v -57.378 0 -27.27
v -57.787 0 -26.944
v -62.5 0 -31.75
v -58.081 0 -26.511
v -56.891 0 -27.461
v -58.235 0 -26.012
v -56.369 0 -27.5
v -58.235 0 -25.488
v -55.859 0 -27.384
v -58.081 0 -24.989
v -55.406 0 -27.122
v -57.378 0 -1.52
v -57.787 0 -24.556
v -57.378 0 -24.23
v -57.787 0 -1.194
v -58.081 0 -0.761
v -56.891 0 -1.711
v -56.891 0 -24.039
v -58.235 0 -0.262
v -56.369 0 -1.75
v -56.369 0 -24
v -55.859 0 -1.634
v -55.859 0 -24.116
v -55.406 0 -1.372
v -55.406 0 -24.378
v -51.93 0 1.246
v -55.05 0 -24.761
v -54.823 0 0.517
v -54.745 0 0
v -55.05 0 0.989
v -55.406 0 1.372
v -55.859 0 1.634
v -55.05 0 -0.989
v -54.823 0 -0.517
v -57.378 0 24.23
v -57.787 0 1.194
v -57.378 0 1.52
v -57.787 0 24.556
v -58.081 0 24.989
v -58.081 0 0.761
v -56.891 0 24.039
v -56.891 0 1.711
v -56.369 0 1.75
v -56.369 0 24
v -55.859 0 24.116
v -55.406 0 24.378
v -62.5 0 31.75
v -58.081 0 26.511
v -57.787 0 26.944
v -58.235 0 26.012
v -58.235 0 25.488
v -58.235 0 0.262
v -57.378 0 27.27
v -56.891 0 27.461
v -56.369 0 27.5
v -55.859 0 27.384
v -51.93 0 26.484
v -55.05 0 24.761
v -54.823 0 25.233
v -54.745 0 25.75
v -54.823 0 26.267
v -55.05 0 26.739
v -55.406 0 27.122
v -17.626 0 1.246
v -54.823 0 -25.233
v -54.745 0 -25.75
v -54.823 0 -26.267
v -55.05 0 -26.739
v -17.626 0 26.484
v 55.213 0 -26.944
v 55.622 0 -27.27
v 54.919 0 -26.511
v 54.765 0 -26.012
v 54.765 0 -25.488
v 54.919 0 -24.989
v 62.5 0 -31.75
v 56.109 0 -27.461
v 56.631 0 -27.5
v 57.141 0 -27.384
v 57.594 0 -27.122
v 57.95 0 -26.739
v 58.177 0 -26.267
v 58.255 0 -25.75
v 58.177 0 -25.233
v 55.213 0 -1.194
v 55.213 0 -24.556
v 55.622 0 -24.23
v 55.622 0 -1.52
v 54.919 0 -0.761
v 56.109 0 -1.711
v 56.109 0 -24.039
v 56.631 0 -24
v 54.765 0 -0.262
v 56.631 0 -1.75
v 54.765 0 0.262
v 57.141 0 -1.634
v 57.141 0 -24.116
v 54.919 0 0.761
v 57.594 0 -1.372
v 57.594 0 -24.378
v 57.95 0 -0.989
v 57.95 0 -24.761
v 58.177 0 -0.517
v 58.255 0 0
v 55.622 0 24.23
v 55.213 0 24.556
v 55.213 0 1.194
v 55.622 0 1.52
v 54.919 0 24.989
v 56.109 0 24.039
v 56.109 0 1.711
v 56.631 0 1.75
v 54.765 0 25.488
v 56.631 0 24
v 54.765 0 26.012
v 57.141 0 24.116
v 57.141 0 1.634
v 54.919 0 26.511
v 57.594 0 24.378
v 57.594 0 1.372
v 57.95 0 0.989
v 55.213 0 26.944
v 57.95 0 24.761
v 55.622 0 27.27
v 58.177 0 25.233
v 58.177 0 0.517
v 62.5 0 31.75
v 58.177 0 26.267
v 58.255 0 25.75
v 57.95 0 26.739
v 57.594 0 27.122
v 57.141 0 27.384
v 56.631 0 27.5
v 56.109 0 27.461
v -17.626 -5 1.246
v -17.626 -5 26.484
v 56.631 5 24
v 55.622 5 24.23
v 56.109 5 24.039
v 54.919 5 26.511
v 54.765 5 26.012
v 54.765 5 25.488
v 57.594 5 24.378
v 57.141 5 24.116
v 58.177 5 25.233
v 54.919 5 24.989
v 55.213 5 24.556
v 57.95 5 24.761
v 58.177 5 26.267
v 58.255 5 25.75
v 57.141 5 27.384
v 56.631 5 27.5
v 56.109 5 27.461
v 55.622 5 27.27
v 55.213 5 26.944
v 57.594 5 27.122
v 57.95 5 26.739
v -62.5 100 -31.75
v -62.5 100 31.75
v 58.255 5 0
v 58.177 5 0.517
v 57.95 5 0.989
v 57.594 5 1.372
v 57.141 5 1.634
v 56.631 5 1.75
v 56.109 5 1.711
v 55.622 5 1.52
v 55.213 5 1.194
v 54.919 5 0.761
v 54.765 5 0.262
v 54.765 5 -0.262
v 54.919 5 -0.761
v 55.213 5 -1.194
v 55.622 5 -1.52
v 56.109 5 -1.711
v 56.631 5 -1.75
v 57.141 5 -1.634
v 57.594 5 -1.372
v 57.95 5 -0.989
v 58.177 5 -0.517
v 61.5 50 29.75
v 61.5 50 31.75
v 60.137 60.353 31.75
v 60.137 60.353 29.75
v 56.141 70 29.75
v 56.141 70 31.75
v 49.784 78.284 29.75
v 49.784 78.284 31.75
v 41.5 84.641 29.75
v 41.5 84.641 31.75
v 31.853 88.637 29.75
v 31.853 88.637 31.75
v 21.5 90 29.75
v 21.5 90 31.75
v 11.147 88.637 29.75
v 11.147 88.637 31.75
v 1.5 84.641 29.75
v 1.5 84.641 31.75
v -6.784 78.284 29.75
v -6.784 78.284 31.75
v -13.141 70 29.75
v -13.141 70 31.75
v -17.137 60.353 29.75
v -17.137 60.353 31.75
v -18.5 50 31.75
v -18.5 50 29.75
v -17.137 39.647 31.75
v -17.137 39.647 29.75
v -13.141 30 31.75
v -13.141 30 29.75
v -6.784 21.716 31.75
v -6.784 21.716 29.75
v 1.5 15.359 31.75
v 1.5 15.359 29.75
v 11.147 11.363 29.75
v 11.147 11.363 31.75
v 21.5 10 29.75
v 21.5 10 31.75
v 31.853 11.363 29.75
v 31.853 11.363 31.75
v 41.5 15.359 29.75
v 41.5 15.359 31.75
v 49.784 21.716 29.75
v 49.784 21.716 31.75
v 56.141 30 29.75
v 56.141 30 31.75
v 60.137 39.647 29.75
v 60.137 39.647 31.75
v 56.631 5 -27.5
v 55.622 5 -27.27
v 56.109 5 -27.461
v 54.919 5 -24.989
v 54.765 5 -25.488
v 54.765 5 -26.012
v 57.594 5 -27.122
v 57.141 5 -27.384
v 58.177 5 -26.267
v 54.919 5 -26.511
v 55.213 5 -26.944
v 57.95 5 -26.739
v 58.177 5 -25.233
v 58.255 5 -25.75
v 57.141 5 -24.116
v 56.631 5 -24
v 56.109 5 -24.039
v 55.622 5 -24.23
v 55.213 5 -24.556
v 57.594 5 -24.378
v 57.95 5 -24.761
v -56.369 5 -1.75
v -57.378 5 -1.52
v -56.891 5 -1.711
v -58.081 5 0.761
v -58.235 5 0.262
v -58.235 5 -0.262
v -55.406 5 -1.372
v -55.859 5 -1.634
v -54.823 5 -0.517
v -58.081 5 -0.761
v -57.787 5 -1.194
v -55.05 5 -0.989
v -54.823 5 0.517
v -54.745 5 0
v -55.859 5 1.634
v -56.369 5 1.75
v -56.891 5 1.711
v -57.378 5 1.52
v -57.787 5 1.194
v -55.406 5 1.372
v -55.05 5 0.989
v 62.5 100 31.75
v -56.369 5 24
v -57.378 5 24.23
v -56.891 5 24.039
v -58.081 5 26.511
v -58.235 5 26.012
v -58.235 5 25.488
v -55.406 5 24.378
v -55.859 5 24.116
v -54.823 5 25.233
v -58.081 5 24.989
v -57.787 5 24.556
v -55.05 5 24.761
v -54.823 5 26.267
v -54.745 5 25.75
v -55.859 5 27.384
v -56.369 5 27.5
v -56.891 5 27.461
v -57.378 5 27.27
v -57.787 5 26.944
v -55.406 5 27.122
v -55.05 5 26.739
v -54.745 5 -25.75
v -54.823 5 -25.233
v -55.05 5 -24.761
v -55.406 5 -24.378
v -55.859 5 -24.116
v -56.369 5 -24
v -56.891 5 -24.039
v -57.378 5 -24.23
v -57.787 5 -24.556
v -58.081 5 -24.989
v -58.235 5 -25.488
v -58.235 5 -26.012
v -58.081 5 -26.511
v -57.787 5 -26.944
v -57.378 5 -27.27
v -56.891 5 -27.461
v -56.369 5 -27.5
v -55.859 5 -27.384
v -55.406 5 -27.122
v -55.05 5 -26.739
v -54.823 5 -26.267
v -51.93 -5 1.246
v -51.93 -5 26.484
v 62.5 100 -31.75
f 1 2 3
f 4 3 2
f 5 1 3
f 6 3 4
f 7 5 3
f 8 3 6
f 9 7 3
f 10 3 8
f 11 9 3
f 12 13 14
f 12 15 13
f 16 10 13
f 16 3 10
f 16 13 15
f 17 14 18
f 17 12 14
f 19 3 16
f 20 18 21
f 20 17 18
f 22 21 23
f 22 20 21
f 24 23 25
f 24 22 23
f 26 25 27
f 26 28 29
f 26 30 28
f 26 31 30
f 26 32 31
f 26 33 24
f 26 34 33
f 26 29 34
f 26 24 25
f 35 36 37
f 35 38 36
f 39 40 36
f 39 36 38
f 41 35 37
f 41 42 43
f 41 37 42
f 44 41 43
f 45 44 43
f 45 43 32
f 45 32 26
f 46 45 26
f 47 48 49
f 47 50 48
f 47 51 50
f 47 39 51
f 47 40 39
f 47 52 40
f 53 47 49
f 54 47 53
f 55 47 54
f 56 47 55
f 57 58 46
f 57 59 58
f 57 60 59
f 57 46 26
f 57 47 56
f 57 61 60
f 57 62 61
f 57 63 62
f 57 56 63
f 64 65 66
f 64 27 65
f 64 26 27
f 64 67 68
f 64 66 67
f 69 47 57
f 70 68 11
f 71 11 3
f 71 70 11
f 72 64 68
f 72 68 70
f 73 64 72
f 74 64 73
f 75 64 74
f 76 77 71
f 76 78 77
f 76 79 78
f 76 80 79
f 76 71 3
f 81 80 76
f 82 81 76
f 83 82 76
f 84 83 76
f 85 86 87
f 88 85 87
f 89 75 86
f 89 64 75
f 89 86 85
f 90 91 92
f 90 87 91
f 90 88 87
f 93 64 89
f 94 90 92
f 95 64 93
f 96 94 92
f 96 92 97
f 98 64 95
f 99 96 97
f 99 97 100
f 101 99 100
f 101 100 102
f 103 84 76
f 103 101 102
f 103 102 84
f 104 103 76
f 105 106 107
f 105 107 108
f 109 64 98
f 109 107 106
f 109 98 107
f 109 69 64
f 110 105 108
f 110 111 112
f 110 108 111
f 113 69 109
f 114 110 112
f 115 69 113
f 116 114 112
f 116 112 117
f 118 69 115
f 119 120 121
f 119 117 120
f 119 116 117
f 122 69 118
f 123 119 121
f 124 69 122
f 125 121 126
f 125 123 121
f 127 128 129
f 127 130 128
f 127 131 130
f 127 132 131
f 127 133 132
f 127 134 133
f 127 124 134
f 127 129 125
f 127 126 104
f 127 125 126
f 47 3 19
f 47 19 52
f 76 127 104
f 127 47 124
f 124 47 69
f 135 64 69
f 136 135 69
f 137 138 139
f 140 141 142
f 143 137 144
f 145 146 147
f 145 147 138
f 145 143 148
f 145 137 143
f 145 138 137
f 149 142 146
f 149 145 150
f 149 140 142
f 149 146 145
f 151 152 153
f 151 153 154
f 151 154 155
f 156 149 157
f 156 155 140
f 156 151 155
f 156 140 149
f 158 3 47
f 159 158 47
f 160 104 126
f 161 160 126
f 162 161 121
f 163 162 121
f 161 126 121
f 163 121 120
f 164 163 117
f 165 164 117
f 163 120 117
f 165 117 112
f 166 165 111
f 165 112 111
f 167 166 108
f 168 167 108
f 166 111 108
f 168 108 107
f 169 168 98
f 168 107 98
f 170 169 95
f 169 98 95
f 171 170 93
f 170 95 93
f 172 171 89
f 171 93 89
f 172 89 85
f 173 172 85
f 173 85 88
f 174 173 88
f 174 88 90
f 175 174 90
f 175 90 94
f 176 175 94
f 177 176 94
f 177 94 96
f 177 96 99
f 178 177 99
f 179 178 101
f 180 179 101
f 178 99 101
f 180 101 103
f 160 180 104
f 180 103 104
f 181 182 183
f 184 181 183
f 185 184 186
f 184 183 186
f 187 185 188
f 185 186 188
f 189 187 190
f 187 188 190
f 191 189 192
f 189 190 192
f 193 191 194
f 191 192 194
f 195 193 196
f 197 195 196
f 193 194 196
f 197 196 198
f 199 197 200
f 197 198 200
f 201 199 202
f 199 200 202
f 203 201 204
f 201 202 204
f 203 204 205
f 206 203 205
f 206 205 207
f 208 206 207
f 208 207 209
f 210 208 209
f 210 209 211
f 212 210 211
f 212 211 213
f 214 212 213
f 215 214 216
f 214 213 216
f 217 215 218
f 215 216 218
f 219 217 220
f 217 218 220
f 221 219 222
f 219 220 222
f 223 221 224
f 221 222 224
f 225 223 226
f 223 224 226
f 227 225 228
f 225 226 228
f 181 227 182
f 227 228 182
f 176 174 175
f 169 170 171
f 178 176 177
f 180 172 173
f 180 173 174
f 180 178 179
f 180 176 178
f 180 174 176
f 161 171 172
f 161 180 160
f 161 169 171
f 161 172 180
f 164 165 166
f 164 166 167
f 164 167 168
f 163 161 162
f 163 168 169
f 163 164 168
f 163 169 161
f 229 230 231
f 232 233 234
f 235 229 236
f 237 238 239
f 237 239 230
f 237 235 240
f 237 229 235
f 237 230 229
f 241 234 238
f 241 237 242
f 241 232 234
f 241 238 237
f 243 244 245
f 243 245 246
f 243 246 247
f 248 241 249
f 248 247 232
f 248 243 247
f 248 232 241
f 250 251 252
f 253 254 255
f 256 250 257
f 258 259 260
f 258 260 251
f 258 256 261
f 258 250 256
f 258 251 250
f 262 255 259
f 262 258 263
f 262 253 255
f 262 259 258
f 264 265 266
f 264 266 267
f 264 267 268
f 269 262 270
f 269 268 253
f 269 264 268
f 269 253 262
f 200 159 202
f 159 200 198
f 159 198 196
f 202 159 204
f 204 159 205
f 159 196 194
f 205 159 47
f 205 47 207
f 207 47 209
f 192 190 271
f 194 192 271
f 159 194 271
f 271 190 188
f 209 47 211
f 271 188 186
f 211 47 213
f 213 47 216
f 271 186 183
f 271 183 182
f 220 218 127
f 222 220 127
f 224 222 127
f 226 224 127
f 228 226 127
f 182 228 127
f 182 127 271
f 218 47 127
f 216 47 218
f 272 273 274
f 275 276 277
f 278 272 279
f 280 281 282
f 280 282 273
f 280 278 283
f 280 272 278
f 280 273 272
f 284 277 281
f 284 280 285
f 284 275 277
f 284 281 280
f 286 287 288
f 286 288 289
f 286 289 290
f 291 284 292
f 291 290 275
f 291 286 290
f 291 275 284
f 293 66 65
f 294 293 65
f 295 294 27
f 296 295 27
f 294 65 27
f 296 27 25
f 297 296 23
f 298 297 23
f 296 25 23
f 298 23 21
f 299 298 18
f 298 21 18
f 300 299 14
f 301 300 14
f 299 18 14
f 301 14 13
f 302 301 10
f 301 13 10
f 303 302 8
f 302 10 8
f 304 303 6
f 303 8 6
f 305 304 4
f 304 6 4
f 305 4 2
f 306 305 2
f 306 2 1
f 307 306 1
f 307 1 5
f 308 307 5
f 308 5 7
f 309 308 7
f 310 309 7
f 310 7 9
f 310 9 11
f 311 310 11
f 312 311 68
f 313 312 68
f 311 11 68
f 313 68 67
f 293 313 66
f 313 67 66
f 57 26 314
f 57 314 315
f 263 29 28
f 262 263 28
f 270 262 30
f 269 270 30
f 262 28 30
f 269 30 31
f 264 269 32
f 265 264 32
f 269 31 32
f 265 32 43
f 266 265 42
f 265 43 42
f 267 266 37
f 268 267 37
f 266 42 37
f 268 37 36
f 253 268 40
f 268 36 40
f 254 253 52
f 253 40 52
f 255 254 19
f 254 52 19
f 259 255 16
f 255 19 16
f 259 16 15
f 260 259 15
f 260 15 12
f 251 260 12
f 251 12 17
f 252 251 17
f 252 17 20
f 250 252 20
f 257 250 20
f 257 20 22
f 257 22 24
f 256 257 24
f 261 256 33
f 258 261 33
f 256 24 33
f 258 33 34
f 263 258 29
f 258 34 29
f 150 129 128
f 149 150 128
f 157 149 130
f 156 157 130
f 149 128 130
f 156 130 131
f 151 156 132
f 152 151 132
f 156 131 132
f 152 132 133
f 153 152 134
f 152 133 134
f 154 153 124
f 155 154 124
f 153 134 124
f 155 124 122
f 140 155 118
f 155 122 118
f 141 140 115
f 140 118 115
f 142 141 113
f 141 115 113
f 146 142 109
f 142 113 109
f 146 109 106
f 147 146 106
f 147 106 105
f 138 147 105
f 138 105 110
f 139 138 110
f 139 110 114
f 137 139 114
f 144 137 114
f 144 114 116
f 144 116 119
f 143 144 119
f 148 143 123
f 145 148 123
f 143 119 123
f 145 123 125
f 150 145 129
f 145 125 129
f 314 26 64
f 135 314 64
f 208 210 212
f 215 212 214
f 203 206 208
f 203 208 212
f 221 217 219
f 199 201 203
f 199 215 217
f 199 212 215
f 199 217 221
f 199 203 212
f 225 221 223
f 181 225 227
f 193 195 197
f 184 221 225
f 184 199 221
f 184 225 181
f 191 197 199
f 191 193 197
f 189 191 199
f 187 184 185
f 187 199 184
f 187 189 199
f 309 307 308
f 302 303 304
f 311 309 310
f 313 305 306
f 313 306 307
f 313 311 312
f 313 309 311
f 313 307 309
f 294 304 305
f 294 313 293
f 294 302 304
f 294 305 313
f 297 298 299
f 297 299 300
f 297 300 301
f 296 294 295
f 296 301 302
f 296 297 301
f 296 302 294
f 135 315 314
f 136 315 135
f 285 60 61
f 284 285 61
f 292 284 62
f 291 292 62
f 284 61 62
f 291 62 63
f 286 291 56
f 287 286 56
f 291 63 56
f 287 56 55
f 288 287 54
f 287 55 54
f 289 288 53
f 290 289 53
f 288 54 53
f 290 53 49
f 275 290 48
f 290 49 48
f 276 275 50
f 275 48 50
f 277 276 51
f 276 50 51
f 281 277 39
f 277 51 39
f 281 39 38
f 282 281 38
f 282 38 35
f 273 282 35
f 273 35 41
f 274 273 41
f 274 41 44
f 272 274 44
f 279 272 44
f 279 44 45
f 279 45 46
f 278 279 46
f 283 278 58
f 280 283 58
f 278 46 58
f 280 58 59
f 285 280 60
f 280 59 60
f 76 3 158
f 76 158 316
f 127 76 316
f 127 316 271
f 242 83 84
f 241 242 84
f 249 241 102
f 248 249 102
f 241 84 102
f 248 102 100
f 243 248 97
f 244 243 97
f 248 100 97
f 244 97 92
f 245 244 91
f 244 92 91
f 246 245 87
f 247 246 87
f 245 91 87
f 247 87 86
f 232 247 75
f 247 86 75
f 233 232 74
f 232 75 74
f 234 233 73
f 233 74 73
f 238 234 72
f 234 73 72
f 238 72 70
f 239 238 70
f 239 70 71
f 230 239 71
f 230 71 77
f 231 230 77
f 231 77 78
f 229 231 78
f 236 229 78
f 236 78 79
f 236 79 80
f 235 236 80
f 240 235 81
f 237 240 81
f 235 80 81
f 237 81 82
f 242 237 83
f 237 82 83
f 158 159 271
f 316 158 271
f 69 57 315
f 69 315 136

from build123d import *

# Parameters (mm, degrees)
F0_W     = 125
F0_H     = 63.5
F0_R     = 1.755
F0_W_2   = 34.3037378043
F0_H_2   = 25.238768314
F1_DEPTH = 100
F2_DEPTH = 5
F3_DEPTH = 5
F4_R     = 40
F5_DEPTH = 2


# Not quite as in the source:
# - a feature names something its author has since deleted; it is built from what else it names


with BuildPart() as f1:
    # F0 (on Front) → F1 (new body)
    with BuildSketch(Plane.XZ):
        Rectangle(F0_W, F0_H)
        with Locations((-56.5, -25.75)):
            Circle(F0_R, mode=Mode.SUBTRACT)
        with Locations((56.5, -25.75)):
            Circle(F0_R, mode=Mode.SUBTRACT)
        with Locations((-56.5, 0)):
            Circle(F0_R, mode=Mode.SUBTRACT)
        with Locations((-34.777761437, 13.8649413711)):
            Rectangle(F0_W_2, F0_H_2, mode=Mode.SUBTRACT)
        with Locations((-56.5, 25.75)):
            Circle(F0_R, mode=Mode.SUBTRACT)
        with Locations((56.5, 0)):
            Circle(F0_R, mode=Mode.SUBTRACT)
        with Locations((56.5, 25.75)):
            Circle(F0_R, mode=Mode.SUBTRACT)
        with Locations((-34.777761437, 13.8649413711)):
            Rectangle(F0_W_2, F0_H_2)
        with Locations((-56.5, 25.75)):
            Circle(F0_R)
        with Locations((-56.5, 0)):
            Circle(F0_R)
        with Locations((-56.5, -25.75)):
            Circle(F0_R)
        with Locations((56.5, -25.75)):
            Circle(F0_R)
        with Locations((56.5, 0)):
            Circle(F0_R)
        with Locations((56.5, 25.75)):
            Circle(F0_R)
    extrude(amount=-F1_DEPTH)

    # F0 (on Front) → F2 (join)
    with BuildSketch(Plane.XZ):
        with Locations((-34.777761437, 13.8649413711)):
            Rectangle(F0_W_2, F0_H_2)
    extrude(amount=F2_DEPTH)

    # F0 (on Front) → F3 (cut)
    with BuildSketch(Plane.XZ):
        with Locations((-56.5, 25.75)):
            Circle(F0_R)
        with Locations((-56.5, 0)):
            Circle(F0_R)
        with Locations((-56.5, -25.75)):
            Circle(F0_R)
        with Locations((56.5, -25.75)):
            Circle(F0_R)
        with Locations((56.5, 0)):
            Circle(F0_R)
        with Locations((56.5, 25.75)):
            Circle(F0_R)
    extrude(amount=-F3_DEPTH, mode=Mode.SUBTRACT)

    # F4 (on face) → F5 (cut)
    with BuildSketch(Plane.XY.offset(31.75)):
        with Locations((21.5, 50)):
            Circle(F4_R)
    extrude(amount=-F5_DEPTH, mode=Mode.SUBTRACT)


solid = f1.part
